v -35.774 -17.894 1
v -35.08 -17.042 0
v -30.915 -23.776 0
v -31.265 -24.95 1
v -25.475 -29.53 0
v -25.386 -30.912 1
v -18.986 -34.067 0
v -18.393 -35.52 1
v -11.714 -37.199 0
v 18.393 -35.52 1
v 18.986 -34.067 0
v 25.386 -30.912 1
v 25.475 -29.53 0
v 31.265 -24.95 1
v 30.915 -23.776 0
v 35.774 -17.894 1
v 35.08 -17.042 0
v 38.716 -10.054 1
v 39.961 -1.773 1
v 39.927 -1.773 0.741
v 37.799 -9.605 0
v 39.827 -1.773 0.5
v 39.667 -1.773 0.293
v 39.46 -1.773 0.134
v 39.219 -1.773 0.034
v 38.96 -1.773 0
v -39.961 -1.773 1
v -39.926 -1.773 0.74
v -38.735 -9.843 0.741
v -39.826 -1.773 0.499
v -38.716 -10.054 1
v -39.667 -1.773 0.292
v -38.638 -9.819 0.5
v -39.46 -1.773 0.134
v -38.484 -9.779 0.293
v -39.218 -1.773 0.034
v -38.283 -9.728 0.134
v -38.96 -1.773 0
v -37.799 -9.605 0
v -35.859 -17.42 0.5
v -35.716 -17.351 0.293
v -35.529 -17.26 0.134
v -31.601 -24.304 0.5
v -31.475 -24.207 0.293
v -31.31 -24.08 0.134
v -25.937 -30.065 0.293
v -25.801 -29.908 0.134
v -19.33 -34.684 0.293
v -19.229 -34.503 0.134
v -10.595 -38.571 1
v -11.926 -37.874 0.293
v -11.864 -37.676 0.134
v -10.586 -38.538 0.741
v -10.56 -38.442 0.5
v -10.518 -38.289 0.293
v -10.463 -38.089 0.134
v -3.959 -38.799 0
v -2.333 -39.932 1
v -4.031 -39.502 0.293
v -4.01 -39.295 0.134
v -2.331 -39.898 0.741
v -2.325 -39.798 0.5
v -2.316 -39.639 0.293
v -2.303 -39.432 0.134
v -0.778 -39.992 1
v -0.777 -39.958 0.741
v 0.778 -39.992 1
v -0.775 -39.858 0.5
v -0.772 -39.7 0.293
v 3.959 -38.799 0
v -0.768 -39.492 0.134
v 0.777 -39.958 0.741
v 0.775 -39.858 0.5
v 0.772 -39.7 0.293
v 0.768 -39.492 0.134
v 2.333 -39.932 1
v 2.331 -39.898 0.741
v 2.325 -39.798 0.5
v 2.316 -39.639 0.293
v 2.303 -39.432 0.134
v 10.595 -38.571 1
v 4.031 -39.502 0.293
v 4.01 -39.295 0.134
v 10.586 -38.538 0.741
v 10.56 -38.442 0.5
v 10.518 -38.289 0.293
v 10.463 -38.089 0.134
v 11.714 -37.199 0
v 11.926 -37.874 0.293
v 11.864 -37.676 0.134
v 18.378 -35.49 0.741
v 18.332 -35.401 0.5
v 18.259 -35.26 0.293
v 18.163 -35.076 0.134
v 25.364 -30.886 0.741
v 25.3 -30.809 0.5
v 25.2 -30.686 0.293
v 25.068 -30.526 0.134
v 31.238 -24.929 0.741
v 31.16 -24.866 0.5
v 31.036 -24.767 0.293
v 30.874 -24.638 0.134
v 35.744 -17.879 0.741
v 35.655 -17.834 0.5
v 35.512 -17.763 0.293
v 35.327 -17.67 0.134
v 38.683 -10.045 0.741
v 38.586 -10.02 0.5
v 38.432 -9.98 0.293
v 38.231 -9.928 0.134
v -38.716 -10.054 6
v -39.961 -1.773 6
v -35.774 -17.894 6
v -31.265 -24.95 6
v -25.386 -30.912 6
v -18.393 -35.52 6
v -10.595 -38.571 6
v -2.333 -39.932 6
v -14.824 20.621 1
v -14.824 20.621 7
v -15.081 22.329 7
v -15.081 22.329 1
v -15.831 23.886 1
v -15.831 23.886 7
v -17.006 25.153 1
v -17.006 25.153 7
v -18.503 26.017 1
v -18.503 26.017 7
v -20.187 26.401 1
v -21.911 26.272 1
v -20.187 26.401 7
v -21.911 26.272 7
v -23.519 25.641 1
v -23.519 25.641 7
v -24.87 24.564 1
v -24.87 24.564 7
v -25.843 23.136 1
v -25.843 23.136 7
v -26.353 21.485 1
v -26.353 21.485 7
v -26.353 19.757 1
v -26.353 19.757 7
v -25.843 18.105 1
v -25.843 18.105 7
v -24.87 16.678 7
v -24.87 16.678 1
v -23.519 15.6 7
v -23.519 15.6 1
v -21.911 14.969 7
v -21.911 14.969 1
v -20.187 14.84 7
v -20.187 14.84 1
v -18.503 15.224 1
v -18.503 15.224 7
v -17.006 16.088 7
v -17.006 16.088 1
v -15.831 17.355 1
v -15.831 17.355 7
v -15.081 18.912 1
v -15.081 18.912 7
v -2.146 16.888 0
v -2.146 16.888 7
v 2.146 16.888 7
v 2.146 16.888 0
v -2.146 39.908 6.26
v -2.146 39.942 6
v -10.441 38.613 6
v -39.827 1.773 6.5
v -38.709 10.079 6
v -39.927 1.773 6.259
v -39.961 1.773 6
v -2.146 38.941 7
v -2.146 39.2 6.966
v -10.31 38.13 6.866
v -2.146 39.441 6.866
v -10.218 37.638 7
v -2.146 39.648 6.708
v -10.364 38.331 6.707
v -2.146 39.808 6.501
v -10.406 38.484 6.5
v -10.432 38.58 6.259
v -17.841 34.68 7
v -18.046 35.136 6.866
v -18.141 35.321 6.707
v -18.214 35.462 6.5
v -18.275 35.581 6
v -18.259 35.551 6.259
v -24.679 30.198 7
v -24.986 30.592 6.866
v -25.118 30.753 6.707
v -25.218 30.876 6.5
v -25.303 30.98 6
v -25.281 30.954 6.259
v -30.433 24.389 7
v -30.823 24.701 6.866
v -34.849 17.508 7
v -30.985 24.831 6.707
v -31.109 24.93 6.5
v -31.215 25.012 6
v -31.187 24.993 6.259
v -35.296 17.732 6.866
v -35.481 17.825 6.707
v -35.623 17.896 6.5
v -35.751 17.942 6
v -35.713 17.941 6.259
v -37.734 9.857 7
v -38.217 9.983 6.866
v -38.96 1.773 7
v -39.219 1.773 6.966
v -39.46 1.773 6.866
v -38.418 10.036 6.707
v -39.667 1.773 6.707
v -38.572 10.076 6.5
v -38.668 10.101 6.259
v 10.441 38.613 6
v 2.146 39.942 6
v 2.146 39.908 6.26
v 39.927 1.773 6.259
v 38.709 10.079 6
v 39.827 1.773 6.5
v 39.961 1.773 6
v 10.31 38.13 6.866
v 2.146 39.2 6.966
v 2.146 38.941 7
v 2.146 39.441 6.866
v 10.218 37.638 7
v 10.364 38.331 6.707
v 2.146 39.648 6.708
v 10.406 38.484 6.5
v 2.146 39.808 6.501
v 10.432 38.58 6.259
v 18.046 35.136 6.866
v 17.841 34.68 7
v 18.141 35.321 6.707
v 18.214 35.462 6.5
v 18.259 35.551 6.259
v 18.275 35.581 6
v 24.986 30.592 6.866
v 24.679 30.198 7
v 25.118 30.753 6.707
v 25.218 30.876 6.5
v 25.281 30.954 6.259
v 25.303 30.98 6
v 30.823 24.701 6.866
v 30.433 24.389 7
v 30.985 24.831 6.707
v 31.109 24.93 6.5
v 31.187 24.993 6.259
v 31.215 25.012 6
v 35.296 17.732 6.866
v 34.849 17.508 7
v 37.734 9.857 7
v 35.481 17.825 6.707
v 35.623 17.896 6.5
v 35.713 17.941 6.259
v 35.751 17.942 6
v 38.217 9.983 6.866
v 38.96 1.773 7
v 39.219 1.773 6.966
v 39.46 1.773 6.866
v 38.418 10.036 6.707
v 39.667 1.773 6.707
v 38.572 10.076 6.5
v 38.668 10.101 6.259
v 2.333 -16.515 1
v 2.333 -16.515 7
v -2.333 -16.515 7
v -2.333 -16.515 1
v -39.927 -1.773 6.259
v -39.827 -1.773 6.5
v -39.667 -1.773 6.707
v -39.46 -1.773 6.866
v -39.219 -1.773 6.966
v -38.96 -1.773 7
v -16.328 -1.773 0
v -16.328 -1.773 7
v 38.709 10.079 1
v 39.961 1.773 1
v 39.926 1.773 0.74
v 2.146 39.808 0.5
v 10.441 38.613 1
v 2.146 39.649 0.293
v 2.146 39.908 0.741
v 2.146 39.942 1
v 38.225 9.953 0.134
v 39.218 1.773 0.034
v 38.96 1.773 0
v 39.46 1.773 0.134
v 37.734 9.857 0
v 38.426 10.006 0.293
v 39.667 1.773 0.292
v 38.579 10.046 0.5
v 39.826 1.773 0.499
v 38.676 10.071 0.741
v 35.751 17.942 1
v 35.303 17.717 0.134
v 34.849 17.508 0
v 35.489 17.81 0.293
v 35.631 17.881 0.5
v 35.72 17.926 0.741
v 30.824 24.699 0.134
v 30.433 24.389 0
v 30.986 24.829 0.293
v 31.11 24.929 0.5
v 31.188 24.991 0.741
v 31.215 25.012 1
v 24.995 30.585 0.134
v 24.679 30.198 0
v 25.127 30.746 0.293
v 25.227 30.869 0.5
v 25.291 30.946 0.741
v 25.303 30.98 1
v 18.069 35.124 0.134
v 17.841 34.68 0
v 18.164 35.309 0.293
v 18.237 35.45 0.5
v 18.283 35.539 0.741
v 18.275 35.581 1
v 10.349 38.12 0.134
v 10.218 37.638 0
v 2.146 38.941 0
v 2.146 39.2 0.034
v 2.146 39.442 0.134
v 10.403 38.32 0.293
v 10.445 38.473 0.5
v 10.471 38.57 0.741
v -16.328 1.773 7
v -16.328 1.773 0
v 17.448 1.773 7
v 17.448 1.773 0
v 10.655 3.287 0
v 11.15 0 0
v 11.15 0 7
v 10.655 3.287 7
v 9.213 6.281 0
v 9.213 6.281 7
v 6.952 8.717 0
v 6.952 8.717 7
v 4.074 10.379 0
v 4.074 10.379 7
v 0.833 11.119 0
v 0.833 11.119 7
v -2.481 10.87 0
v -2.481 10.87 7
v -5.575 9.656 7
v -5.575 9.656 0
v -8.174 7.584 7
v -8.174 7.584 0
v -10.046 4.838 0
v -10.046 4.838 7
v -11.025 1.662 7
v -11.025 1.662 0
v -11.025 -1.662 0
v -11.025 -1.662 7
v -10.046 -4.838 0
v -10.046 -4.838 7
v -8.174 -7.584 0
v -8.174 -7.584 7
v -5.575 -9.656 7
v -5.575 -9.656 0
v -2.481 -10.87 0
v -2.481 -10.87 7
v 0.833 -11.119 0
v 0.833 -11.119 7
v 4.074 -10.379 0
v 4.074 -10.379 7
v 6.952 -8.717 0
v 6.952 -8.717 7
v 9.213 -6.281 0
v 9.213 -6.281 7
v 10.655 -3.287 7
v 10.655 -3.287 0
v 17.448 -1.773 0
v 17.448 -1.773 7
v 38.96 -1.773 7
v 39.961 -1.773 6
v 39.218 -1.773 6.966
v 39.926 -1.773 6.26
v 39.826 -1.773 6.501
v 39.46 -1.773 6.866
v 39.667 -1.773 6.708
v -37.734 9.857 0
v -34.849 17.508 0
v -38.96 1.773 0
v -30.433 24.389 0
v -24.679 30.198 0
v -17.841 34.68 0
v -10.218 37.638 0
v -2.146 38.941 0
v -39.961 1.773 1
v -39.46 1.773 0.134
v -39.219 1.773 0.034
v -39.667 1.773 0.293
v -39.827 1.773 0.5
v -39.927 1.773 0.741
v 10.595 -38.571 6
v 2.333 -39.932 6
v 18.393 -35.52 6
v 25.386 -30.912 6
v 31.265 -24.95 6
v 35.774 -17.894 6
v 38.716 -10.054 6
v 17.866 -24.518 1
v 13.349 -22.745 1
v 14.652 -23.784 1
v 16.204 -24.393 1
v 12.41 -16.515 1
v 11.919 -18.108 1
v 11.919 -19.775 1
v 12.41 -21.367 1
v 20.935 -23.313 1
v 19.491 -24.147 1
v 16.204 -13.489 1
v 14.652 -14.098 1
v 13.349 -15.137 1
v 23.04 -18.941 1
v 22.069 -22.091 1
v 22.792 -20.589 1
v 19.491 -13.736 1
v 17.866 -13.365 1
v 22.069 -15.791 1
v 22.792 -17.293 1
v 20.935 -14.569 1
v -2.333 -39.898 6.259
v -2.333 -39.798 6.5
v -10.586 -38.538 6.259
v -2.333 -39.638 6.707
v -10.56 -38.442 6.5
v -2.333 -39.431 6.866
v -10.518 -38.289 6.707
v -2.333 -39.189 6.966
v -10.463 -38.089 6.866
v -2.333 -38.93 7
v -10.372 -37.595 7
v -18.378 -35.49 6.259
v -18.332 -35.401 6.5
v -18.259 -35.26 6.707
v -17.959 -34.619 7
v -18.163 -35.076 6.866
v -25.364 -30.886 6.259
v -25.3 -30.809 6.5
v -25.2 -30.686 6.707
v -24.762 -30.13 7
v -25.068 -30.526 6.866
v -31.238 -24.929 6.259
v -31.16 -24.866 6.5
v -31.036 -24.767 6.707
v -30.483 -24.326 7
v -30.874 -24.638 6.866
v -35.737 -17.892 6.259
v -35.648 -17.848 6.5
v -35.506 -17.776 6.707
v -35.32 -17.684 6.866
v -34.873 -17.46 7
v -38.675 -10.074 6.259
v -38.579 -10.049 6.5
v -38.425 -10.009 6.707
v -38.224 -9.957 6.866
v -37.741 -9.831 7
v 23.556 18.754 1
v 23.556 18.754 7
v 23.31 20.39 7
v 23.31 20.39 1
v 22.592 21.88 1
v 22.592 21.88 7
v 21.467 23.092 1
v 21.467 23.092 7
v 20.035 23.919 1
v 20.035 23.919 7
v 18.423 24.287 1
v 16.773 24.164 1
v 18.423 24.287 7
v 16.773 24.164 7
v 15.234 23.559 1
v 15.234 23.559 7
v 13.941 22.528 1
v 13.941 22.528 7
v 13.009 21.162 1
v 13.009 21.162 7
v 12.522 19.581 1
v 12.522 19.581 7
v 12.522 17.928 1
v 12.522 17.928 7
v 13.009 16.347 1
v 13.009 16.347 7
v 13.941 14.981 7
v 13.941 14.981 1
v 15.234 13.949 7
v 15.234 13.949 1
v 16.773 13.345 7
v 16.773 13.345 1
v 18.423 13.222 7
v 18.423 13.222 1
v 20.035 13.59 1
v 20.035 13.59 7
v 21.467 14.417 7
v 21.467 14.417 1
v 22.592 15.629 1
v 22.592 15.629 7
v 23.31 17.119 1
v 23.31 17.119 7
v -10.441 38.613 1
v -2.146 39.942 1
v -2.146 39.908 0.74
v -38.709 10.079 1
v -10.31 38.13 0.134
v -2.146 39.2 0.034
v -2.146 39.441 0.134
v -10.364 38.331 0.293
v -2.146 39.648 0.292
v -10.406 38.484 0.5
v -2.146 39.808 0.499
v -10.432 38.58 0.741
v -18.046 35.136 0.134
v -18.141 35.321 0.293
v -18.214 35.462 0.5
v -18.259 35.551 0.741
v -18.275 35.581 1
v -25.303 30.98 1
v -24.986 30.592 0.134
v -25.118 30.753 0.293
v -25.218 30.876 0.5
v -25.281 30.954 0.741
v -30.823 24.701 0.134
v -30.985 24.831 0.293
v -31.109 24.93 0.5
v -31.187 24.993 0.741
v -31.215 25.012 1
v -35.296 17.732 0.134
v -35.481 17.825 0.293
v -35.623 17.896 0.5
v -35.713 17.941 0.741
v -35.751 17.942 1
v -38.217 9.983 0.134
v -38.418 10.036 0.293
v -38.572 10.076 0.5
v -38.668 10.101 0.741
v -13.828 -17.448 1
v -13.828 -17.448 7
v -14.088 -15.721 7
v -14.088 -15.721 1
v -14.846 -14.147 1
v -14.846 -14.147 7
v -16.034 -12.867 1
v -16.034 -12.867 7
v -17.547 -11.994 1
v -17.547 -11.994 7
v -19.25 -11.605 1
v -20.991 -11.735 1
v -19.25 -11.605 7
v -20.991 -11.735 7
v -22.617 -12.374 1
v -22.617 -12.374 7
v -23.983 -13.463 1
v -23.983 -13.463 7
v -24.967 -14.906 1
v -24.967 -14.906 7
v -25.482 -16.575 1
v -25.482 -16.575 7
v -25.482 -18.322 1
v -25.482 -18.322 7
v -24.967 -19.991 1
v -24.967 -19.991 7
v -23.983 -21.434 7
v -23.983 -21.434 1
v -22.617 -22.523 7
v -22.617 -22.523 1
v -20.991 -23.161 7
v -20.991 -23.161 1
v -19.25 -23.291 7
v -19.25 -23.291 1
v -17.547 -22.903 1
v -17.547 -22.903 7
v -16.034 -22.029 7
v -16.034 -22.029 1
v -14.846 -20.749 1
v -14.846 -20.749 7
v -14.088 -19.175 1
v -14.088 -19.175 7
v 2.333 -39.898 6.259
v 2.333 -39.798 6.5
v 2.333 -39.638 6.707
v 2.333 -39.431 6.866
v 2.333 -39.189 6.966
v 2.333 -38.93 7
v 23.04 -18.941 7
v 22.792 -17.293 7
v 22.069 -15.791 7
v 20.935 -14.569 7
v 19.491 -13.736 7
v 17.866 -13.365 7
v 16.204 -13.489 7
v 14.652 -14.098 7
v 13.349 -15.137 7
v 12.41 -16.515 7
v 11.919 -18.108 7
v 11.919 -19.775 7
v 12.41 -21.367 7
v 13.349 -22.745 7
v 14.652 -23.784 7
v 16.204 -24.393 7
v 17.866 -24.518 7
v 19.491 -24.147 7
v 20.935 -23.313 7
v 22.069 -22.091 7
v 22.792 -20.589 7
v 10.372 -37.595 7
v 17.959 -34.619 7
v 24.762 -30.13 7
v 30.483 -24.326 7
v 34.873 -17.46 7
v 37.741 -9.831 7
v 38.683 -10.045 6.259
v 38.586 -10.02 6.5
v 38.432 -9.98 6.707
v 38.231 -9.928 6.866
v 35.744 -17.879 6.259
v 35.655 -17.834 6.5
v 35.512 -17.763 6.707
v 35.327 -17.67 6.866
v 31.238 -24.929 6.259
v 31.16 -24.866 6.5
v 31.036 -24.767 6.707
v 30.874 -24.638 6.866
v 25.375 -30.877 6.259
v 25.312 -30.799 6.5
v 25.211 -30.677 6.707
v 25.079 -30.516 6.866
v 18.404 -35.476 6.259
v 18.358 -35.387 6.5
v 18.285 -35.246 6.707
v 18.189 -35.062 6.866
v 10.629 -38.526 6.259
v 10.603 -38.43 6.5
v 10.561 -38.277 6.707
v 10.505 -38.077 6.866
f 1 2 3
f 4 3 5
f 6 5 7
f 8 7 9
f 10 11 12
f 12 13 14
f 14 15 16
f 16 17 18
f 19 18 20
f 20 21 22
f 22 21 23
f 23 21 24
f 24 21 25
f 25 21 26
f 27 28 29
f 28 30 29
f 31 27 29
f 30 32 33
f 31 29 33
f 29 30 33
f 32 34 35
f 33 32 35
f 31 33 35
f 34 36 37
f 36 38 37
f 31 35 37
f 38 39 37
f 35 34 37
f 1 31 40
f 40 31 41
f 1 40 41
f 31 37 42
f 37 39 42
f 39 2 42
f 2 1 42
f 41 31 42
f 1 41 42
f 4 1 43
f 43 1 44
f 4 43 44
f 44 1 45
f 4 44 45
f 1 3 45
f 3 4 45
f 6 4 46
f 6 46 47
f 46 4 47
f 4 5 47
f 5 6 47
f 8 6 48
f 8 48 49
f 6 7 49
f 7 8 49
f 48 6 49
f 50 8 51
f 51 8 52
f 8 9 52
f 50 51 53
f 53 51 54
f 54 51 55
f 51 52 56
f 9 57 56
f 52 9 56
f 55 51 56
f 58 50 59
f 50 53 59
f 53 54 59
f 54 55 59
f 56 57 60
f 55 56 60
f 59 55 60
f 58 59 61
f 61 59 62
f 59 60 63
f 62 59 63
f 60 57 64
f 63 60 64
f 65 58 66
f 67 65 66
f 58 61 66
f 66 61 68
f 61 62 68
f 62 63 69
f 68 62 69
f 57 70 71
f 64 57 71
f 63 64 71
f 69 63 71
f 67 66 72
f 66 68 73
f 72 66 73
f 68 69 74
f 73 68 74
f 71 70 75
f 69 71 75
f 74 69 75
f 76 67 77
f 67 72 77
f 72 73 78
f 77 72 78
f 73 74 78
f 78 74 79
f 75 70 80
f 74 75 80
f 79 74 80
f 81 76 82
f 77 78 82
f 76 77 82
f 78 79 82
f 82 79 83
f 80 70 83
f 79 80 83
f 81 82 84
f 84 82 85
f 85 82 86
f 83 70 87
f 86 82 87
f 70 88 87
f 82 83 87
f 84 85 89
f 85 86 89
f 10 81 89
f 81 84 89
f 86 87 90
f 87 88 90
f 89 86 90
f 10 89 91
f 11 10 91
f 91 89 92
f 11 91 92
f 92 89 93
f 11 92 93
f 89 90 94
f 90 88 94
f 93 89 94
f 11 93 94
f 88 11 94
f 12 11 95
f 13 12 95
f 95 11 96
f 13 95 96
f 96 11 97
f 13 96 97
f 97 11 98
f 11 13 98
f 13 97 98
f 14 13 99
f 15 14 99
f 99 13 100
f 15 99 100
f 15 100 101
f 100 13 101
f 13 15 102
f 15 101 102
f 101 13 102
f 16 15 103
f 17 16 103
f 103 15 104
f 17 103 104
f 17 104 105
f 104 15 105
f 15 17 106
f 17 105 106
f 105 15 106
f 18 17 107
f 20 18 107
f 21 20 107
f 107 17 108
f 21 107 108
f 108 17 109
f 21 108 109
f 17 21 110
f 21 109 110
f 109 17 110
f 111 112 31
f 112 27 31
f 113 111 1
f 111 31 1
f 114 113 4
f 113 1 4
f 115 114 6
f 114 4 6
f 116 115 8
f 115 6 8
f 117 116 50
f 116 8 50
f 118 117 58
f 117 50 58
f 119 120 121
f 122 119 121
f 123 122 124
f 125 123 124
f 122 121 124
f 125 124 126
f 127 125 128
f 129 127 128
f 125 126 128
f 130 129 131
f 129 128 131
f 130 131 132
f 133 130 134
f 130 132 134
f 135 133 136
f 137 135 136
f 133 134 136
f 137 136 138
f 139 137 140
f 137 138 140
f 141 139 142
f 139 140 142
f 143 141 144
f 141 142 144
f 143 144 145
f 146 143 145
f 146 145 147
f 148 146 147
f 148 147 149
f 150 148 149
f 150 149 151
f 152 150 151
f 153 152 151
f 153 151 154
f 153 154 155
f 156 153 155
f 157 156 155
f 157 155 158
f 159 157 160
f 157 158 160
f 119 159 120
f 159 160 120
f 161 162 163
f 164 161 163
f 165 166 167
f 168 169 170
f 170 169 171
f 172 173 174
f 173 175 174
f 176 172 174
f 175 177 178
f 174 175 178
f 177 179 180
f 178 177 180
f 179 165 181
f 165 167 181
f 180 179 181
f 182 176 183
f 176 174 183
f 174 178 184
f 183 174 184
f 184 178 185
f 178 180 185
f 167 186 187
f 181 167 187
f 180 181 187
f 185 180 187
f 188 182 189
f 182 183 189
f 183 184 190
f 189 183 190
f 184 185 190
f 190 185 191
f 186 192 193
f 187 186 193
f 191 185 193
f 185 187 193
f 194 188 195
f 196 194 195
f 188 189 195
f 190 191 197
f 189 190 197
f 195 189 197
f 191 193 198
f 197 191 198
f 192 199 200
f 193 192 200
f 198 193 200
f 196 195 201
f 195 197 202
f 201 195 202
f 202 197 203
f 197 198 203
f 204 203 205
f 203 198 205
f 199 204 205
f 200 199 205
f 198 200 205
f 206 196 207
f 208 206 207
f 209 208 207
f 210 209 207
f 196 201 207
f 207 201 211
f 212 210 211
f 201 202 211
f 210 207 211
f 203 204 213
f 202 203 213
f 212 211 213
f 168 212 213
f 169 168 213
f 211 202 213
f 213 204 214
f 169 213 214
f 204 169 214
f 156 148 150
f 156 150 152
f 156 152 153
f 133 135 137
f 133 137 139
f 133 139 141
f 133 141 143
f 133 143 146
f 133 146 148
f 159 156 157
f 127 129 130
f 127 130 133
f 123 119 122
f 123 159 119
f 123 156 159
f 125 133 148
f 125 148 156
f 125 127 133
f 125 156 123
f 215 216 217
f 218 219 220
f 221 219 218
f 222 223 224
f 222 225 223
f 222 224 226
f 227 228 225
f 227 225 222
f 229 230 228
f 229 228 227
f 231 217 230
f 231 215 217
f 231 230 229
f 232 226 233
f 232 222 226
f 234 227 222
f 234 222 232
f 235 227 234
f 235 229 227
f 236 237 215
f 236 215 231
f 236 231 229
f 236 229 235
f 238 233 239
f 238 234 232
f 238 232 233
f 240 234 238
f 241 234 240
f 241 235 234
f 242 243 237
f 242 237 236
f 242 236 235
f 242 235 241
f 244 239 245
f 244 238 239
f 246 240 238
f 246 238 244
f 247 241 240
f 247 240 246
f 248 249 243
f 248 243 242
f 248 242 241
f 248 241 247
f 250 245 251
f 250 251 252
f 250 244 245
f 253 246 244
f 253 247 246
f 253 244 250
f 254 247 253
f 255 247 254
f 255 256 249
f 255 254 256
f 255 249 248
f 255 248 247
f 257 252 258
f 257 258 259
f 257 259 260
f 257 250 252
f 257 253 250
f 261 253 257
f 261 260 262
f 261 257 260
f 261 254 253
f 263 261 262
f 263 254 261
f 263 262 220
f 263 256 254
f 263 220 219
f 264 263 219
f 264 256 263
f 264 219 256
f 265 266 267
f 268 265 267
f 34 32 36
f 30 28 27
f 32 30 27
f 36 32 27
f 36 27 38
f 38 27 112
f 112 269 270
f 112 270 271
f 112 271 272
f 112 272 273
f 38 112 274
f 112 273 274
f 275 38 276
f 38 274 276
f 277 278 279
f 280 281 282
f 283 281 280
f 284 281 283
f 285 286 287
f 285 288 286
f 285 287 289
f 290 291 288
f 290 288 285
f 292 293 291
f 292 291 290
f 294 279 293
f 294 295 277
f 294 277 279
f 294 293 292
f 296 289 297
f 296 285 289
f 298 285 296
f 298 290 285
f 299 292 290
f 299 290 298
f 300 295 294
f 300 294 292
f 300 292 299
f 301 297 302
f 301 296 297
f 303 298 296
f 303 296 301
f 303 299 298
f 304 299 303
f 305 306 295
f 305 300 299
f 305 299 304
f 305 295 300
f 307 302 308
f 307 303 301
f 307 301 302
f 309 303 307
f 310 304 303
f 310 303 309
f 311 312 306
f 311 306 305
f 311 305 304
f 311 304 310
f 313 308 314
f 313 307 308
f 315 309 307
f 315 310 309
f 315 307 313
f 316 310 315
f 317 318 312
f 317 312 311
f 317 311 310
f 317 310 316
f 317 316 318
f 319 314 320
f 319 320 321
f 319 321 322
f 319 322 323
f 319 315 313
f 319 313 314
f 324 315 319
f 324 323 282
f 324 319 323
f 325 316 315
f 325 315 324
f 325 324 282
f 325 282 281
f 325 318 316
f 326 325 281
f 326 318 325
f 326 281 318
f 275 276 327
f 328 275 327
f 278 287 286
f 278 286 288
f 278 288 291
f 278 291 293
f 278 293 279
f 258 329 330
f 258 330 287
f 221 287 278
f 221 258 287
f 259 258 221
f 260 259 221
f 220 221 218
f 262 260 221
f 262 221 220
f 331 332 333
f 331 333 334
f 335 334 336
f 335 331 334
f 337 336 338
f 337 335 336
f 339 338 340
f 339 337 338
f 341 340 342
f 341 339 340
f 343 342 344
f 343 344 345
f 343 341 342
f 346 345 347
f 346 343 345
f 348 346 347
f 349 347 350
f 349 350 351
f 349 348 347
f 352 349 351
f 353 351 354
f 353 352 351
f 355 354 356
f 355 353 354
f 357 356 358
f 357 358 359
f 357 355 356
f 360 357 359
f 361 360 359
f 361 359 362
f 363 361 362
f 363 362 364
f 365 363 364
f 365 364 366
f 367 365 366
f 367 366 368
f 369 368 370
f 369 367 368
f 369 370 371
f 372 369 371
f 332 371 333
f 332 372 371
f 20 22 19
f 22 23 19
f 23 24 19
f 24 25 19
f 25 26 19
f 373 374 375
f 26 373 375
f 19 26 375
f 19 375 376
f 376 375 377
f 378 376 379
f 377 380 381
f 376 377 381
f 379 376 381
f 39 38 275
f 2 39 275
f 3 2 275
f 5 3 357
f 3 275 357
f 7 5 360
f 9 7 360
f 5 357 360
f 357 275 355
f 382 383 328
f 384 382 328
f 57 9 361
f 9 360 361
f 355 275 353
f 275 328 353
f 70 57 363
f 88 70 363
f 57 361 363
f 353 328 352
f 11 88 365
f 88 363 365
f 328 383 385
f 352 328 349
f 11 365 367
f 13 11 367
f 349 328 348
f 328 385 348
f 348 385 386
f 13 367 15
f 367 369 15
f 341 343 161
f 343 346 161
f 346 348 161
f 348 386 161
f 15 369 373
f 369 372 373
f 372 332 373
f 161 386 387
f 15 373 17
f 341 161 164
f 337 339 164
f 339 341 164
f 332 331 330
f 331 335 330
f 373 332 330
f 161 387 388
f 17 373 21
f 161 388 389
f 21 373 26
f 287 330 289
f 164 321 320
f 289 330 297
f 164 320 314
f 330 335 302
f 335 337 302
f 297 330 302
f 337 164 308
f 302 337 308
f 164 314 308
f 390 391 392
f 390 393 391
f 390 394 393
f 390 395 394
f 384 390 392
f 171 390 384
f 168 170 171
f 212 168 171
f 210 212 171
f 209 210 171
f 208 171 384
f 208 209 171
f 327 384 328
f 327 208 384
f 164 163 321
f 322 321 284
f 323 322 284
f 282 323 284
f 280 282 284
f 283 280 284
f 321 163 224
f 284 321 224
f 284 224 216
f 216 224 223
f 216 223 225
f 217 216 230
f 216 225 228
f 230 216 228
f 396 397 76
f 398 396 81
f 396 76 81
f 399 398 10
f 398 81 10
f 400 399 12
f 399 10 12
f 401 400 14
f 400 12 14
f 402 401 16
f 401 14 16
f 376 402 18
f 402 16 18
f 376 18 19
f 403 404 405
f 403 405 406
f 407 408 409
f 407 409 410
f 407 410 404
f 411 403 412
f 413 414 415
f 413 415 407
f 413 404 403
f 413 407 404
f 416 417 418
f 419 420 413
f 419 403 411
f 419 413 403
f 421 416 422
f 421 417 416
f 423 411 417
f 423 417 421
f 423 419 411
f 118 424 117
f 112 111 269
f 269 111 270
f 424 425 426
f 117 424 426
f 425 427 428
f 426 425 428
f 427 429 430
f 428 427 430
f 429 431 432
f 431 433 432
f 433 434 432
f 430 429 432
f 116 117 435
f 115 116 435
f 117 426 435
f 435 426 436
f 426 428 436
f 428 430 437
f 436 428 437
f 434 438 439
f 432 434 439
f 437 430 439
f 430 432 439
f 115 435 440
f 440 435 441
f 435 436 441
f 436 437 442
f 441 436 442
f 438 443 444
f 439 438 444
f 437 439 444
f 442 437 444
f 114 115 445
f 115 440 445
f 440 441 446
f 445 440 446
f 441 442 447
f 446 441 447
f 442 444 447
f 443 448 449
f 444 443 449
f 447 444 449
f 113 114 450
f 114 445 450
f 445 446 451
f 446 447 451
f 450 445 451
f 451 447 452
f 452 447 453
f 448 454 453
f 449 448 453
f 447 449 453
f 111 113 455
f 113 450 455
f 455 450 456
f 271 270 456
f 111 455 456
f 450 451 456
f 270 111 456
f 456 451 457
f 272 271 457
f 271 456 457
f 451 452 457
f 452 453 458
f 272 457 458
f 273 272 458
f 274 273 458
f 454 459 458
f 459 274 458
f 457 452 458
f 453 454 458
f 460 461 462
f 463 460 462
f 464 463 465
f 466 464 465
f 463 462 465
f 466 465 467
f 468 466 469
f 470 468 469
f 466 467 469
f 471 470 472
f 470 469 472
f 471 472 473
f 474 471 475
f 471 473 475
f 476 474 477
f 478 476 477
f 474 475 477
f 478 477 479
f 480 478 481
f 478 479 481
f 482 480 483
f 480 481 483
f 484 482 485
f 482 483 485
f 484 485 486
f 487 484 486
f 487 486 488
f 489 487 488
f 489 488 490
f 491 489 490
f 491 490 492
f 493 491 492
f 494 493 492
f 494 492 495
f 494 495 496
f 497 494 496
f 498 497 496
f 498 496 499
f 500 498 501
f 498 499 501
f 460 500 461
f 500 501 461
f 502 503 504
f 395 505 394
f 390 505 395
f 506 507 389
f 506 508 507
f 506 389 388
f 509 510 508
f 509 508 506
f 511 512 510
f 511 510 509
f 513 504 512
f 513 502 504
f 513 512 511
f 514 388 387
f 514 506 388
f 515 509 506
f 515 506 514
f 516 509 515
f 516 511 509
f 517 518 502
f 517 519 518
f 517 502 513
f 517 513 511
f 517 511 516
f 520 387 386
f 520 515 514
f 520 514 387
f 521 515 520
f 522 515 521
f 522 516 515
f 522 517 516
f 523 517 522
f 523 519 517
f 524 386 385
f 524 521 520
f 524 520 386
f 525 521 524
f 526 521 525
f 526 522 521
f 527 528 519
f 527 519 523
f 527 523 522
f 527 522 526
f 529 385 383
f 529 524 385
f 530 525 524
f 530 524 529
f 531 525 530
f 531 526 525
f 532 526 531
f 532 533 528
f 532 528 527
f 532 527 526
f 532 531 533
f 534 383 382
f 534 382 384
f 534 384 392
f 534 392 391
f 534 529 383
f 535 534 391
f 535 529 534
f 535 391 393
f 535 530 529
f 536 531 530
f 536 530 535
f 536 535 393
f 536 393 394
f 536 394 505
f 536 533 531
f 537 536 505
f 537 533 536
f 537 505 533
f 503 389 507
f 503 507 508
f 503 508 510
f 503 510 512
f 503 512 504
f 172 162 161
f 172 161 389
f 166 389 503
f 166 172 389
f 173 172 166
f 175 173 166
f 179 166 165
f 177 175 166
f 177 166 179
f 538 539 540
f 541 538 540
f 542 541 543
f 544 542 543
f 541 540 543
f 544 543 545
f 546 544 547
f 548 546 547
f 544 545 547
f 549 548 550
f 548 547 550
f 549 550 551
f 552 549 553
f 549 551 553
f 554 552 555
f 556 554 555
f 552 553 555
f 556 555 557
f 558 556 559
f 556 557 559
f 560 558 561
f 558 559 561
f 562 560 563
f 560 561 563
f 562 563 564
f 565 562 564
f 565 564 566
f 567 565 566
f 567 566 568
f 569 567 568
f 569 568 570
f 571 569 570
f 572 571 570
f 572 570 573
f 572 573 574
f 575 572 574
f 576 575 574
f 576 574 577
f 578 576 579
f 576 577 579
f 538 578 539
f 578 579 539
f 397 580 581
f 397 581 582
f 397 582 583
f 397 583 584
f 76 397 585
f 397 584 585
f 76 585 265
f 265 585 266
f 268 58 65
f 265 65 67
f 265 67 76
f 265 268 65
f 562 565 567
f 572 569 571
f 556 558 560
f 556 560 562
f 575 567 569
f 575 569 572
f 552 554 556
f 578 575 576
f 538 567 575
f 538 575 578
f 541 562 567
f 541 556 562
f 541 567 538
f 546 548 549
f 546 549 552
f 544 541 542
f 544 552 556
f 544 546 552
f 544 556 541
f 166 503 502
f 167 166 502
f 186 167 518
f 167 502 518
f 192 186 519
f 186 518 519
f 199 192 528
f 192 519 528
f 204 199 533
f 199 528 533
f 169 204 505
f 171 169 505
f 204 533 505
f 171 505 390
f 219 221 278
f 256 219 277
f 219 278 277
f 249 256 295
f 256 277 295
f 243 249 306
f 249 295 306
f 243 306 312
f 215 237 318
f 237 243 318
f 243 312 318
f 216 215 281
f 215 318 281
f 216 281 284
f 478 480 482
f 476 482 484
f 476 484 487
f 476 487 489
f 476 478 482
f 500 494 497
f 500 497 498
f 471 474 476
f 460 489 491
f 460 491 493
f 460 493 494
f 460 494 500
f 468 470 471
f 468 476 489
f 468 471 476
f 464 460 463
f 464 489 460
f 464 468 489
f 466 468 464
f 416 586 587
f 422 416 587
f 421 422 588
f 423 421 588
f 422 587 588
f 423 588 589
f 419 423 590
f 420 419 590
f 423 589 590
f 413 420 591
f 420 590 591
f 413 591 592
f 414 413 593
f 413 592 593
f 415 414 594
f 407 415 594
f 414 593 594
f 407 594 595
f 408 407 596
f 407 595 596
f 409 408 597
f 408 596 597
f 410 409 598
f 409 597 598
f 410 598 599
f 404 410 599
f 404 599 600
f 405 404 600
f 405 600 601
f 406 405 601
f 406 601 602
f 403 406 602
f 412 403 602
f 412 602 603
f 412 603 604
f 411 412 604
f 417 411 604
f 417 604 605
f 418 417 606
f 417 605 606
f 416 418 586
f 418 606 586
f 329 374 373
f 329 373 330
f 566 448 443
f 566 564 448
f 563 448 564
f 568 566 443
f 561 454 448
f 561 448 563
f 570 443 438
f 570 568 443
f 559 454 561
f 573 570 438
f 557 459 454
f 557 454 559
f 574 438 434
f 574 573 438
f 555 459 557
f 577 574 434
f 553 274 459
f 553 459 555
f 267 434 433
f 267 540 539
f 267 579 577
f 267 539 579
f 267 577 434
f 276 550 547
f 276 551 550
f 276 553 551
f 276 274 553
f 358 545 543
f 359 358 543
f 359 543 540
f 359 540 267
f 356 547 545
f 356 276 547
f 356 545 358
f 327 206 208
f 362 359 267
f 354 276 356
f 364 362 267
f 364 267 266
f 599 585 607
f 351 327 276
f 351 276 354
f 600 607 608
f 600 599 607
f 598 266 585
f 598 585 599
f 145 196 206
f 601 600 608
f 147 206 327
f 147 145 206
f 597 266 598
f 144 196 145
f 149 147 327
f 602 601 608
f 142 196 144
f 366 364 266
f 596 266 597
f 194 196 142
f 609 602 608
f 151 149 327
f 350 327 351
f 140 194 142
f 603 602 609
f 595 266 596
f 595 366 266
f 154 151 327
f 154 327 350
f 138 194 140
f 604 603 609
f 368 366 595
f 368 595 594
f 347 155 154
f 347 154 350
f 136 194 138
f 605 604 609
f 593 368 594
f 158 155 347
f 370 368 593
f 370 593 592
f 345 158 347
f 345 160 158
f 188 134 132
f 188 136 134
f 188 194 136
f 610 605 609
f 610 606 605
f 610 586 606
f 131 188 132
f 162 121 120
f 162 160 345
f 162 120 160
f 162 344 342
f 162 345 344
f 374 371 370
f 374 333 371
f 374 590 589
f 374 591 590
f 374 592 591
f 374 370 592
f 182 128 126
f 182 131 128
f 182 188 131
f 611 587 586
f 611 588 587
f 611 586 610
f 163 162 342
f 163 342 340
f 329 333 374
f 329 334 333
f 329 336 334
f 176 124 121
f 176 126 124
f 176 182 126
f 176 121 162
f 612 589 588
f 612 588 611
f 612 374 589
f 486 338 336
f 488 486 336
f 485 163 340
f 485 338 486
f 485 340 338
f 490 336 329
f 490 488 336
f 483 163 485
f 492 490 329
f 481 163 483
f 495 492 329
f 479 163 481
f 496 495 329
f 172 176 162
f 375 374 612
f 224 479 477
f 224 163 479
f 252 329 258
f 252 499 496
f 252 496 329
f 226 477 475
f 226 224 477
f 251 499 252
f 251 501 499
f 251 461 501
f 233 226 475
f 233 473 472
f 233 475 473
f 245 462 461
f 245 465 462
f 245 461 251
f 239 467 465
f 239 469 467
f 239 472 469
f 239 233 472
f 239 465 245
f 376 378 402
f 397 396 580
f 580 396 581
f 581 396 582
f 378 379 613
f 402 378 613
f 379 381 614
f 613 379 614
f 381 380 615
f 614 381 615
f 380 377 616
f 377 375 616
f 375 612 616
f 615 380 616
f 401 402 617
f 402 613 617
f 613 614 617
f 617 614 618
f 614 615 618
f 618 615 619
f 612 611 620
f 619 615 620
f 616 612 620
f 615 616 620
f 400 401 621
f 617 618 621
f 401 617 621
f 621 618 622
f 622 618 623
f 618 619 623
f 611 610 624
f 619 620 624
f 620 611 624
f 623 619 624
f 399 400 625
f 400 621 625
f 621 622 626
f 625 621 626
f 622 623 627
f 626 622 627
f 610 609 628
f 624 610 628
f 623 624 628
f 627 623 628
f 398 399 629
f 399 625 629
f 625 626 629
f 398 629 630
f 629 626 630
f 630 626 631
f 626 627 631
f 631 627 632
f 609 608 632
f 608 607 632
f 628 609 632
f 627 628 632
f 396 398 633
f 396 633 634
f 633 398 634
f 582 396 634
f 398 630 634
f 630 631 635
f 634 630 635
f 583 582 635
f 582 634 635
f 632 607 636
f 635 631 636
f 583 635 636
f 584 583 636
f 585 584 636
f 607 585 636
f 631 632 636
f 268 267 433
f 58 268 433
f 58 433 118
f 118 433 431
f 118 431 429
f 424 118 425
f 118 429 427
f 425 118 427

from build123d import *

# Parameters (mm, degrees)
F0_R      = 40
F0_R_2    = 11.15
F1_DEPTH  = 7
F3_W      = 4.2920620181
F3_H      = 25.3791473806
F4_DEPTH  = 50
F5_W      = 38.4419448674
F5_H      = 3.5456162877
F6_DEPTH  = 25
F8_W      = 29.4845998287
F8_H      = 3.5456162877
F9_DEPTH  = 25
F12_R     = 1
F13_DEPTH = 6
F10_R     = 5.7969793016
F10_R_2   = 5.8597151437
F11_R     = 5.5483568343
F11_R_2   = 5.5921159978
F14_DEPTH = 6


with BuildPart() as f1:
    # F0 (on Top) → F1 (new body)
    with BuildSketch(Plane.XY):
        Circle(F0_R)
        Circle(F0_R_2, mode=Mode.SUBTRACT)
    extrude(amount=F1_DEPTH)

    # F3 (on face) → F4 (cut)
    with BuildSketch(Plane.XY.offset(7)):
        with Locations((0, 29.5779034495)):
            Rectangle(F3_W, F3_H)
    extrude(amount=-F4_DEPTH, mode=Mode.SUBTRACT)

    # F5 (on face) → F6 (cut)
    with BuildSketch(Plane.XY.offset(7)):
        with Locations((-35.5494692922, 0)):
            Rectangle(F5_W, F5_H)
    extrude(amount=-F6_DEPTH, mode=Mode.SUBTRACT)

    # F8 (on face) → F9 (cut)
    with BuildSketch(Plane.XY.offset(7)):
        with Locations((32.1904607117, 0)):
            Rectangle(F8_W, F8_H)
    extrude(amount=-F9_DEPTH, mode=Mode.SUBTRACT)

    # F12
    f12_edges = [f1.edges().sort_by_distance(p)[0] for p in [
        (-28.416076, 28.15185, 7),
        (-28.416076, 28.15185, 0),
        (0, -40, 0),
        (28.416076, 28.15185, 0),
        (0, -40, 7),
        (28.416076, 28.15185, 7),
    ]]
    fillet(f12_edges, radius=F12_R)

    # F7 (on face) → F13 (cut)
    with BuildSketch(Plane.XY.offset(7)):
        with BuildLine():
            ThreePointArc((-2.3326422088, -39.9319268296), (0, -40), (2.3326422088, -39.9319268296))
            Line((2.3326422088, -39.9319268296), (2.3326422088, -16.5151059628))
            Line((2.3326422088, -16.5151059628), (-2.3326422088, -16.5151059628))
            Line((-2.3326422088, -16.5151059628), (-2.3326422088, -39.9319268296))
        make_face()
    extrude(amount=-F13_DEPTH, mode=Mode.SUBTRACT)

    # F10 (on face) + F11 (on face) → F14 (cut)
    with BuildSketch(Plane.XY.offset(7)):
        with Locations((-20.6205584109, 20.6205565482)):
            Circle(F10_R)
        with Locations((-19.687499851, -17.4481645226)):
            Circle(F10_R_2)
    with BuildSketch(Plane.XY.offset(7)):
        with Locations((18.0079955608, 18.7544431537)):
            Circle(F11_R)
        with Locations((17.4481645226, -18.9410559833)):
            Circle(F11_R_2)
    extrude(amount=-F14_DEPTH, mode=Mode.SUBTRACT)


solid = f1.part
